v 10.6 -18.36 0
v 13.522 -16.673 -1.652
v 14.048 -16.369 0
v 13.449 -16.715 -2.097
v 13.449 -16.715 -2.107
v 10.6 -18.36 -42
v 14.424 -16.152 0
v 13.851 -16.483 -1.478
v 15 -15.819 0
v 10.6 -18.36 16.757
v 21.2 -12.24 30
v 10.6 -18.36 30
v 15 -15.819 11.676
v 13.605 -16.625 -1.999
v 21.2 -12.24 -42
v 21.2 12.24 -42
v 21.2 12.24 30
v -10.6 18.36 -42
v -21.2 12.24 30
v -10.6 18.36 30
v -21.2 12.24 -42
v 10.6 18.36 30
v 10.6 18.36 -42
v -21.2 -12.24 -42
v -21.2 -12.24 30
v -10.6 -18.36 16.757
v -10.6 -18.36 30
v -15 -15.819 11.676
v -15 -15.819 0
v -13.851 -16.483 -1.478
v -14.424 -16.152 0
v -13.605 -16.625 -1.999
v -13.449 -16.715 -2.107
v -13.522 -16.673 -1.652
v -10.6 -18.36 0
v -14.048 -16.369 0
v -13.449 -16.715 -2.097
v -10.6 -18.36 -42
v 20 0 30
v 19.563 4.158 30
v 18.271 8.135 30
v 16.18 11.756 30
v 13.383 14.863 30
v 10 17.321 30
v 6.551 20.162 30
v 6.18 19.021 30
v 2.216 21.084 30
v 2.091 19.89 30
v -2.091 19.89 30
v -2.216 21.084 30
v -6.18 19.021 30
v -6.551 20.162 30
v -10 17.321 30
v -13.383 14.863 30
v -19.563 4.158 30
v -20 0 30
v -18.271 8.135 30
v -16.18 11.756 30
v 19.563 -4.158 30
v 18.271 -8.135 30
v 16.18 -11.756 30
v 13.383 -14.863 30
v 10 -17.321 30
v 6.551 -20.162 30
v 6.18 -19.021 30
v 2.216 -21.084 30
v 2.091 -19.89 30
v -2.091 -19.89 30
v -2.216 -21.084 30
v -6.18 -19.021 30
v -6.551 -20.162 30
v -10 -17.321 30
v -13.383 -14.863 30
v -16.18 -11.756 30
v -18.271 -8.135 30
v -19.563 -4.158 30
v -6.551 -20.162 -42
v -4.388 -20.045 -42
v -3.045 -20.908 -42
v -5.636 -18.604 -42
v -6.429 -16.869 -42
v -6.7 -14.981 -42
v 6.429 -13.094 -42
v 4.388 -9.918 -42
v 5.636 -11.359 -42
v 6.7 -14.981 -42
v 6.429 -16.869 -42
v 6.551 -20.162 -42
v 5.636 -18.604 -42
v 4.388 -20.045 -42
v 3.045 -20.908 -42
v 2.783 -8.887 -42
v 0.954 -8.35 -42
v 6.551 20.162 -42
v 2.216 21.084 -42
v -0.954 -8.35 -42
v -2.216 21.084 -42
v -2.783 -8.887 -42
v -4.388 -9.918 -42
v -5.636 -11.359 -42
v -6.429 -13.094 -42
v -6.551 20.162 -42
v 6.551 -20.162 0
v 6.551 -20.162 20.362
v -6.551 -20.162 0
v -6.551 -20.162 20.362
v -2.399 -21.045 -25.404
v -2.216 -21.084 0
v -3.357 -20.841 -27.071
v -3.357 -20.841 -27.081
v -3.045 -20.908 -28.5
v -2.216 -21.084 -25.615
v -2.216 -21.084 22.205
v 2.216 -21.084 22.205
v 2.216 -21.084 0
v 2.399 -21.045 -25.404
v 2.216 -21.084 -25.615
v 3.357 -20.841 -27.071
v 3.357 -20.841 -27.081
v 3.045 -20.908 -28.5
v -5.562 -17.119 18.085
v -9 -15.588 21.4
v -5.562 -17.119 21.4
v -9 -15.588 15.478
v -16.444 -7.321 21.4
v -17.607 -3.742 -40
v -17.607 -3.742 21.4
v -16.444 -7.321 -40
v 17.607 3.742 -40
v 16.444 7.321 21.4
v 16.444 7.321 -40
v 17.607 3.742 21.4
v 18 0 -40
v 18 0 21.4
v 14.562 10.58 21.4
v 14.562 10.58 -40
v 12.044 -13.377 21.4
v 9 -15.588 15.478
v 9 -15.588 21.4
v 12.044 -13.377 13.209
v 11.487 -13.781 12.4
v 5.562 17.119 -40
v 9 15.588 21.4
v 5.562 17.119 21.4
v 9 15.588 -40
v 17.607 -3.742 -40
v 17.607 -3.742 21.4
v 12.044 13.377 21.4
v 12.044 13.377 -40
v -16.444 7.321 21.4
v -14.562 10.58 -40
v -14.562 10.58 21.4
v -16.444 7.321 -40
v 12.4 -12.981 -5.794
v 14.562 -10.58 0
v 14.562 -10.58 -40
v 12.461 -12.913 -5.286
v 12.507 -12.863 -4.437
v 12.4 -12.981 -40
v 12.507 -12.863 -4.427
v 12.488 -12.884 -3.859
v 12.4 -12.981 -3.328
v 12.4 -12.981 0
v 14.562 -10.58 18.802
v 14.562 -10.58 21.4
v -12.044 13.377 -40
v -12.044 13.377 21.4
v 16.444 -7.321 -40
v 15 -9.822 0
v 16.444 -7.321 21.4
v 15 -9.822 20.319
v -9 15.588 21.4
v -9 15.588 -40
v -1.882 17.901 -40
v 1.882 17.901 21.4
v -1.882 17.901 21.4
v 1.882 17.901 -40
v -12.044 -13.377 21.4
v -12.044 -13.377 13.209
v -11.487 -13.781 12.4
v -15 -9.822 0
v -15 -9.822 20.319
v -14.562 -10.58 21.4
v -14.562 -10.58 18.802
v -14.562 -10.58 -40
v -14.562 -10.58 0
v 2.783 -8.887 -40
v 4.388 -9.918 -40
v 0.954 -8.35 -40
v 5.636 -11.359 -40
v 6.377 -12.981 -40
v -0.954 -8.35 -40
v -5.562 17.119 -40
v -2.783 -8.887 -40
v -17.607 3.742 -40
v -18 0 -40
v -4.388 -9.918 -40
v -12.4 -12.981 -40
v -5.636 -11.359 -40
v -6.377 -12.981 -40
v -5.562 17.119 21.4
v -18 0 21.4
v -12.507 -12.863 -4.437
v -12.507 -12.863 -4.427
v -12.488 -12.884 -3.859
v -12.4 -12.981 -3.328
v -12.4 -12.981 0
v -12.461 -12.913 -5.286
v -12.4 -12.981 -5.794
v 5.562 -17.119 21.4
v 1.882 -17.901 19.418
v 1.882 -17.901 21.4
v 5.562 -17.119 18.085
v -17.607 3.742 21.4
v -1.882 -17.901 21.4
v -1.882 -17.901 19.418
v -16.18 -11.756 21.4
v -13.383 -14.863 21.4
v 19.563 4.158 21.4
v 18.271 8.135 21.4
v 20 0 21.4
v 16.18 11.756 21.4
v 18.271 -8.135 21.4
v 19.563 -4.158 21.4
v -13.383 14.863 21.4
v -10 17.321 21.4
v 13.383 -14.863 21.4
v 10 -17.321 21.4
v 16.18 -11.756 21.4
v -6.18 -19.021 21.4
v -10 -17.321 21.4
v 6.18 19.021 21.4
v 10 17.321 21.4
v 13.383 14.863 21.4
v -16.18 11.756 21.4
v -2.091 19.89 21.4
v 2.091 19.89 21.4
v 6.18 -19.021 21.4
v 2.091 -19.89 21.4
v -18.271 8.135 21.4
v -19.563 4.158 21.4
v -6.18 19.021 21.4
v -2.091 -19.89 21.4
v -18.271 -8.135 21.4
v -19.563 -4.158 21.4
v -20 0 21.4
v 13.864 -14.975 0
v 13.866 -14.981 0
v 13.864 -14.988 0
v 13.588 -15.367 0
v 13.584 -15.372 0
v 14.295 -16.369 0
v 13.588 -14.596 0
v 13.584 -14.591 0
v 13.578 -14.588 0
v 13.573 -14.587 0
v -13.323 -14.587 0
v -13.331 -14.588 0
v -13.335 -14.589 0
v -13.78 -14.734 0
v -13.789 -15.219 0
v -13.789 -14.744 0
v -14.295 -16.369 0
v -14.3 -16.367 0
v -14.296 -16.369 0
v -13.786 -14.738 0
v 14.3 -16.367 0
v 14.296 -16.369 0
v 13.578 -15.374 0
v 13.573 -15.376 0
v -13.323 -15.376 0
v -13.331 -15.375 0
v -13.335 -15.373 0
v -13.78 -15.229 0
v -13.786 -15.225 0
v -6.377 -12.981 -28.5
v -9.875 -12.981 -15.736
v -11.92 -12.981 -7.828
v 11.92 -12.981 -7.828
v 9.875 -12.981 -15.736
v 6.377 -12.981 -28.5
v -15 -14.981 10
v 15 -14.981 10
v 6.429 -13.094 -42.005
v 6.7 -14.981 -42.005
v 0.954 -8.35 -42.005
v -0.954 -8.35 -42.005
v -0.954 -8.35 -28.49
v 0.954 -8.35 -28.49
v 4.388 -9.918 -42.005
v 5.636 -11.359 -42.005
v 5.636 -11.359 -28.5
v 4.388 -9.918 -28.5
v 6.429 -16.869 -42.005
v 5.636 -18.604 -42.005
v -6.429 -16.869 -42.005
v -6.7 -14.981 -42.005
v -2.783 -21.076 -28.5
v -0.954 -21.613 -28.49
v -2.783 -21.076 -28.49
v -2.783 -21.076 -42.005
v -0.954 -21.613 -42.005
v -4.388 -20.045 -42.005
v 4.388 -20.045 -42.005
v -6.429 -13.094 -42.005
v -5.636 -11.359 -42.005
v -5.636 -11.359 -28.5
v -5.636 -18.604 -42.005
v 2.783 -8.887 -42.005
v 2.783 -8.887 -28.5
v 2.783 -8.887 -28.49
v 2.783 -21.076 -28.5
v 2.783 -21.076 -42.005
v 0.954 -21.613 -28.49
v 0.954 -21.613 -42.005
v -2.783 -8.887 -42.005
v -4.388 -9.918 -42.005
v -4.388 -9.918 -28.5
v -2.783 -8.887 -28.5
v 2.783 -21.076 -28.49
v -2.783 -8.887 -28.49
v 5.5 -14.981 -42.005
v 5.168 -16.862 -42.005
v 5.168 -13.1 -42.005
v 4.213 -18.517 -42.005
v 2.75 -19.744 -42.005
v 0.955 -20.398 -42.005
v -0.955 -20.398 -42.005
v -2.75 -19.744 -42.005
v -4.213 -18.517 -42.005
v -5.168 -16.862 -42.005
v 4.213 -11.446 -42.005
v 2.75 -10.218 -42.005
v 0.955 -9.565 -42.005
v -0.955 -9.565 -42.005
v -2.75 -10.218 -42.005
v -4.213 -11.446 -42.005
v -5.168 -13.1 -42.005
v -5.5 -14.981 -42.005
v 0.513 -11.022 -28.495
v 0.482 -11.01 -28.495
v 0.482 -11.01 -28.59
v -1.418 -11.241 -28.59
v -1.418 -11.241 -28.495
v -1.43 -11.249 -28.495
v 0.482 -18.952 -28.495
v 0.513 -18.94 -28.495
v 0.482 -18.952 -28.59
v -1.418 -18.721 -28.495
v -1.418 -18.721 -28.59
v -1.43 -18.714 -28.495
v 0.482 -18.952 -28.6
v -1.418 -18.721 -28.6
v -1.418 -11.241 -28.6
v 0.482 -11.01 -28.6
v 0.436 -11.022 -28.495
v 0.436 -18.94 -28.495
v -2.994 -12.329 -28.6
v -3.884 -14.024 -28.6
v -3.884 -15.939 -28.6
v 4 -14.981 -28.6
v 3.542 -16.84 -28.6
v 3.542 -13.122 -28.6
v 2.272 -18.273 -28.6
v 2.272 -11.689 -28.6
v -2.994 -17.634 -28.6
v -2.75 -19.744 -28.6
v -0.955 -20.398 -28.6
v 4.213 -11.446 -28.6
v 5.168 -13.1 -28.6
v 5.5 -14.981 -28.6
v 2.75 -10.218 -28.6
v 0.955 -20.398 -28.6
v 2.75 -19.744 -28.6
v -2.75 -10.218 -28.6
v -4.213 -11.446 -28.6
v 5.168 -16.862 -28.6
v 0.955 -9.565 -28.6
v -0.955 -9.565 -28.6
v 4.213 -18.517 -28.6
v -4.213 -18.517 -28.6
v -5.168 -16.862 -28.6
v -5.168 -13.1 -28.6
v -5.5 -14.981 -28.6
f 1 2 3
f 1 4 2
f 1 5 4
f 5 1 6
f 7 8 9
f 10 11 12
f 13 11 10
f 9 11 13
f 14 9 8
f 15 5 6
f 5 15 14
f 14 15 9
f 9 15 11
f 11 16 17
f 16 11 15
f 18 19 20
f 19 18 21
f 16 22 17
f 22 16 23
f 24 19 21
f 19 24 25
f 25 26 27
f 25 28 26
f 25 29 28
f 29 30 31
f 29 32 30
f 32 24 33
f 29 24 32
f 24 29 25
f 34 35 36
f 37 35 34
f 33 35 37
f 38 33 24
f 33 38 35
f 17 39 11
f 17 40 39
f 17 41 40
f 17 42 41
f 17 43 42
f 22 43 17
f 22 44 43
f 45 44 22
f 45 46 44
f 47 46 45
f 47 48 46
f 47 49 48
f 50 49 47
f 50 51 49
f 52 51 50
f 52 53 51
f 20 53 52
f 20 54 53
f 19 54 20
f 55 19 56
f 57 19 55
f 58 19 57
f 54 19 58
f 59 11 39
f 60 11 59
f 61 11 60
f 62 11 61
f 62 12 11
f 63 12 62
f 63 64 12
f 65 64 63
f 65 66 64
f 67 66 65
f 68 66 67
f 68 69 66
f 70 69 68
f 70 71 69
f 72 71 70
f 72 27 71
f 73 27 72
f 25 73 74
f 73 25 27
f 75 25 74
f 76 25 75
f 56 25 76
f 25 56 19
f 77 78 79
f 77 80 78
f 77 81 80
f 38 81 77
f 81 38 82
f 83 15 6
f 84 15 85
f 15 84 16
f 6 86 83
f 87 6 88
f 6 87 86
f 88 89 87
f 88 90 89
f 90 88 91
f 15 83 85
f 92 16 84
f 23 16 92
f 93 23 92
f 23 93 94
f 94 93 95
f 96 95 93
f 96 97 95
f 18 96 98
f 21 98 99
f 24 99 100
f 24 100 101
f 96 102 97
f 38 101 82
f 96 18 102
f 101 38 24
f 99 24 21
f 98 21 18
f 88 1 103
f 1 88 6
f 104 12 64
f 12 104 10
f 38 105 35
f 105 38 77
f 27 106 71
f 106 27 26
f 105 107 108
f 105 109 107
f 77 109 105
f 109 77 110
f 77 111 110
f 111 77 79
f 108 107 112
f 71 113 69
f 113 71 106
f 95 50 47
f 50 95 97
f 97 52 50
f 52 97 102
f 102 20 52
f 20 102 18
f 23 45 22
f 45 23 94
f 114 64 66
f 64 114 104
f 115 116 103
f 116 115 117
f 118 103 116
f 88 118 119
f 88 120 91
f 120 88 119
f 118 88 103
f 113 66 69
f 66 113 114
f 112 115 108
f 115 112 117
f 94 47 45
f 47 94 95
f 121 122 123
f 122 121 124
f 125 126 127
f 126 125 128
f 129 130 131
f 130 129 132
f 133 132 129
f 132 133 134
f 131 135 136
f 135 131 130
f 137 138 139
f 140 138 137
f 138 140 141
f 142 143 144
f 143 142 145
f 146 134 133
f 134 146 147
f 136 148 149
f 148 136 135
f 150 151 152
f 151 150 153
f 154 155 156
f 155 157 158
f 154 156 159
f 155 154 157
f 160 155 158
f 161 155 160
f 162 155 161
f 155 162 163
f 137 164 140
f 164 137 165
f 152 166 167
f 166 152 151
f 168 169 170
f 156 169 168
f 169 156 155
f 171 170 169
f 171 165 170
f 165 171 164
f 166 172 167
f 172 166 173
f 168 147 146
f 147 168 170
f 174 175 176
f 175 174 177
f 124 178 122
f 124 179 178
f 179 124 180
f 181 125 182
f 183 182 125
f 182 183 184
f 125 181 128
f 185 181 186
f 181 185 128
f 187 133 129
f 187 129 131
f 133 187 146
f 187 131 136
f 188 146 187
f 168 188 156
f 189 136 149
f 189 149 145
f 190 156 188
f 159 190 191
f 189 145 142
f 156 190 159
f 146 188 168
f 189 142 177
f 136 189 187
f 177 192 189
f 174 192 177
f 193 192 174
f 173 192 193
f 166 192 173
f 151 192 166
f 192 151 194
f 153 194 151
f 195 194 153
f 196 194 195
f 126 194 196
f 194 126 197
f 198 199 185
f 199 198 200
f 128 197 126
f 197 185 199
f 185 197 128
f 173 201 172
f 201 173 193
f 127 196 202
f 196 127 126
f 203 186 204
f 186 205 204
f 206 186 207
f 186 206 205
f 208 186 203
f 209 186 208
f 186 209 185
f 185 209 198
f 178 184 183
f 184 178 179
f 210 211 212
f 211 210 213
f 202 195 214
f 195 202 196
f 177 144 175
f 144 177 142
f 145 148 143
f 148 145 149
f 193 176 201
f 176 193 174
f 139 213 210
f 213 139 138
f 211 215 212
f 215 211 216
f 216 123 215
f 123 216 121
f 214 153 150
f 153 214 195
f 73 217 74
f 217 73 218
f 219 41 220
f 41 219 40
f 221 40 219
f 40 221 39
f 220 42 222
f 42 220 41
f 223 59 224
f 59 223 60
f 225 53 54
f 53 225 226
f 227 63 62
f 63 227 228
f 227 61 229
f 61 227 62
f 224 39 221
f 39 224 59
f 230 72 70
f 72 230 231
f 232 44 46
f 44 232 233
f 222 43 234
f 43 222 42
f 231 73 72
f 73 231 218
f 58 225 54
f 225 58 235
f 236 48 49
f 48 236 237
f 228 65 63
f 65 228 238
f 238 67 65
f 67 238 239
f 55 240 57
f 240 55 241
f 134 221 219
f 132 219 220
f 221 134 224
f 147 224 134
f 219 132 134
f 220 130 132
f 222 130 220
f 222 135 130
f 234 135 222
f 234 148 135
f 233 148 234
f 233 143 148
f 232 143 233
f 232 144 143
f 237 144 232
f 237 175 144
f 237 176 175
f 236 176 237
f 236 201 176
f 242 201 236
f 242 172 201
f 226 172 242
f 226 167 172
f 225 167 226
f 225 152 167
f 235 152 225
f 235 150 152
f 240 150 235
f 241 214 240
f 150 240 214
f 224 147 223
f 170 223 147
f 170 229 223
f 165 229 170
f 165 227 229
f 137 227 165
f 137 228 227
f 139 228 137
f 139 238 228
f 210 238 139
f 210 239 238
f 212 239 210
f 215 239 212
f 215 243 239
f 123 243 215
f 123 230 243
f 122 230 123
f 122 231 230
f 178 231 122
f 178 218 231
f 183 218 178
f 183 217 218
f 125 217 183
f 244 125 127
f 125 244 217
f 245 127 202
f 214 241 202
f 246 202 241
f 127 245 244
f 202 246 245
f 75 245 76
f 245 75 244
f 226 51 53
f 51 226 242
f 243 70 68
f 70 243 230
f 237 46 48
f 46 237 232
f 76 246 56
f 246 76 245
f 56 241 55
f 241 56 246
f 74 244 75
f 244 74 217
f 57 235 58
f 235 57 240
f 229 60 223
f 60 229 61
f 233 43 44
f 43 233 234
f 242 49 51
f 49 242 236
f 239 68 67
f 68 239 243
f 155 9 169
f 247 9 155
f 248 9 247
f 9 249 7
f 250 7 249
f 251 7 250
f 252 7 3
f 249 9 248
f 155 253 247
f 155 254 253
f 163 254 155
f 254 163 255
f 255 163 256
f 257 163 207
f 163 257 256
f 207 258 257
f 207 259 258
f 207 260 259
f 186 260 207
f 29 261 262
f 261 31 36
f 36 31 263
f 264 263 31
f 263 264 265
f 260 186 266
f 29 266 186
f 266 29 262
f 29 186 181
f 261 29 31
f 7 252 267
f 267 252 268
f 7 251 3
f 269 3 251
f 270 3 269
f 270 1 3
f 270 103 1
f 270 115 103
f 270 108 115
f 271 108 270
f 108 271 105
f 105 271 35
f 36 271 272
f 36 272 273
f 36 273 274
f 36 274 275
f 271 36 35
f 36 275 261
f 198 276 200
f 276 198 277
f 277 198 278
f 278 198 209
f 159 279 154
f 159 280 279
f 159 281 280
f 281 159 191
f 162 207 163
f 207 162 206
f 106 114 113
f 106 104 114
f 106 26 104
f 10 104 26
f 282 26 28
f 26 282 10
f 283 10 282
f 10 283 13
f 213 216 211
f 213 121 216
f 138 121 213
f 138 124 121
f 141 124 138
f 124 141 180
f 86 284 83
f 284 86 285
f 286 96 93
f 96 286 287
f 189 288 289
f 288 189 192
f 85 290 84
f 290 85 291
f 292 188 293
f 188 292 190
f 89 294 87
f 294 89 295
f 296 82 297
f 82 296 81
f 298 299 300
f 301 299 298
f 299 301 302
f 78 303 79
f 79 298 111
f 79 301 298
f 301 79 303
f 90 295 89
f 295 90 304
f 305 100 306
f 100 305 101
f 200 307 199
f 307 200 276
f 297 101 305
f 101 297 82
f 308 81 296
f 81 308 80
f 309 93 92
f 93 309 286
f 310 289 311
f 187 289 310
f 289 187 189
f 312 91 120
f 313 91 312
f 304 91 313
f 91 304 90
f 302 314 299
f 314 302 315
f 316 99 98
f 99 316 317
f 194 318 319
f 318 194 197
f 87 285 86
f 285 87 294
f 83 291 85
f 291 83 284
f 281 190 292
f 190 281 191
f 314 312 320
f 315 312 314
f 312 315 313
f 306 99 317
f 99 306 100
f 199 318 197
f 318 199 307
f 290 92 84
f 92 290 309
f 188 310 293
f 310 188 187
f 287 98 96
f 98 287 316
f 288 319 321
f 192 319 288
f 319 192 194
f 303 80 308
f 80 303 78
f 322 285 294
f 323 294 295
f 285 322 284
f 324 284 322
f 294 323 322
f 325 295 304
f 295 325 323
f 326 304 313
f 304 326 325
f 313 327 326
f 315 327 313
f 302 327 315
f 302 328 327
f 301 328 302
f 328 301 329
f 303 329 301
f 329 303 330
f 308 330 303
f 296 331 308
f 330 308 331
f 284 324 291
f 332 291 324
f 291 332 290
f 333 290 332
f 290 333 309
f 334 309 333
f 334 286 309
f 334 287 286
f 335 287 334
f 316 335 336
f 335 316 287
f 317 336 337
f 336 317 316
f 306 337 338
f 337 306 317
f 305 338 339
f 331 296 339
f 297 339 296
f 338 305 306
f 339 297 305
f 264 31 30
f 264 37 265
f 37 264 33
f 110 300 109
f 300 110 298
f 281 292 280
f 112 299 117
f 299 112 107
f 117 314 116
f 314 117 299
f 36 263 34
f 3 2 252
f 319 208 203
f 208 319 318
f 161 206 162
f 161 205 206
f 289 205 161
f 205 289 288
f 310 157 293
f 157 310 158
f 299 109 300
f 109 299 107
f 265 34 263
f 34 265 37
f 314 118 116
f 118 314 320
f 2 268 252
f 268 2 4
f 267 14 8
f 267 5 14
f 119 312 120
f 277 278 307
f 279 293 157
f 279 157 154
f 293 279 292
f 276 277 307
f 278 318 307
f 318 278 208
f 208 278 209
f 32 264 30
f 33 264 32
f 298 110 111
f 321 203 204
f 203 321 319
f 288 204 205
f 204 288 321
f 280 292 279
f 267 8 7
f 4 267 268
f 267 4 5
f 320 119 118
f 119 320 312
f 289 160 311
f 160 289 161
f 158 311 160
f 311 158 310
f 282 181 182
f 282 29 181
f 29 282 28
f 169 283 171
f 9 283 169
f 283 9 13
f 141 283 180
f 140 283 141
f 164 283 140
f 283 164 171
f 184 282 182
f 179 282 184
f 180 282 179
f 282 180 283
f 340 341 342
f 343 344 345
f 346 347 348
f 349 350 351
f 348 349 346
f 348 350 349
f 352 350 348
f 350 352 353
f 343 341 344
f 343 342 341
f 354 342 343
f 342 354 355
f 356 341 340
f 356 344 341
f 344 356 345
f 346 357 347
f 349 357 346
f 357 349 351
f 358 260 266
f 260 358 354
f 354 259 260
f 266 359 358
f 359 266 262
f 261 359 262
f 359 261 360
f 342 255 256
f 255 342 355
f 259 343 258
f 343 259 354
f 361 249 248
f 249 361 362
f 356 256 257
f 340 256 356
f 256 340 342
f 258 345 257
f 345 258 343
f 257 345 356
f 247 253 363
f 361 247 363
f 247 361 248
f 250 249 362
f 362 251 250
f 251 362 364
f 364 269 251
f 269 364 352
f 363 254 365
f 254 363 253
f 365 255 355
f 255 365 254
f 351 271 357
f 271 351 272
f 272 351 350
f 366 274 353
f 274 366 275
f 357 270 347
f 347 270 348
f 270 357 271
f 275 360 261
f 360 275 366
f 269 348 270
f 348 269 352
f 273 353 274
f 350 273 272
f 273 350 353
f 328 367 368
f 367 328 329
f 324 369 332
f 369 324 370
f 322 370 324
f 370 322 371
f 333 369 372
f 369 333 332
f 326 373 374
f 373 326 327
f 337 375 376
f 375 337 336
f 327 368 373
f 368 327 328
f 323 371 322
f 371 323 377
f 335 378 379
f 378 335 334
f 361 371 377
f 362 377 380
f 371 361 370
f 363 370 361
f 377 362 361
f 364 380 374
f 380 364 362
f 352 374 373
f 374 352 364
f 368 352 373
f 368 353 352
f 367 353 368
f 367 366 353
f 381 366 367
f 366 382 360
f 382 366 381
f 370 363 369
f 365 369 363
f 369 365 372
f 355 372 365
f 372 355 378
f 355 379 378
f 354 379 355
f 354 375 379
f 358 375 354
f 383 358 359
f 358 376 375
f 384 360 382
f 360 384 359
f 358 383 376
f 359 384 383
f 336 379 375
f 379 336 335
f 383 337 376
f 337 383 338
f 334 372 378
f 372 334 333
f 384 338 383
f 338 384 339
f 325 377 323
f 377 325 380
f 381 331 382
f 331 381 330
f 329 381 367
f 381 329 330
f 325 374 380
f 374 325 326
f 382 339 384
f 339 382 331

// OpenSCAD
// file: OpenSCAD_support/straight_flue.scad
// straight loft and accesoires 

module curvedFlueLoft(upperDiameter, lowerDiameter, loftCeiling, loftFloor){
    union(){
        // tube
        hull(){
        	translate([0, airSupplyY, loftFloor]) 
                cylinder(h=0.01, d=lowerDiameter, center=true);
        	translate([0, airSupplyY, (ground + tubeInsert)])
                cylinder(h=0.01, d=lowerDiameter, center=true);
        }
        // straight flue
            hull(){
            translate ([labiumWidth*-0.45, airSupplyY, loftCeiling]) 
                cylinder (0.01, d=upperDiameter);
            translate ([labiumWidth*0.45, airSupplyY, loftCeiling]) 
                cylinder (0.01, d=upperDiameter);
            translate ([0, airSupplyY, (loftFloor + tubeInsert)]) 
                cylinder (0.01, d=lowerDiameter);
        };
    };
}

module outer_straight_flue(){
    curvedFlueLoft(    
        upperDiameter = (flueWidth + 2 * minWallThickness), 
        lowerDiameter = (outerTube + 2 * minWallThickness),
        loftCeiling = 0,
        loftFloor = ground
    );
}

module inner_straight_flue(){
    curvedFlueLoft(
        upperDiameter = flueWidth, 
        lowerDiameter = innerTube, 
        loftCeiling = 0.1, 
        loftFloor = (ground-0.1)
    ); 
}

module straight_flue_fill(){
    translate ([0, 0, ground])
        intersection(){
            cylinder(height, d=(outerDiameter + 2* minWallThickness));
            translate([labiumWidth*-0.5, airSupplyY - outerDiameter + minWallThickness + flueWidth, 0])
                cube([labiumWidth, outerDiameter, floorThickness + lengthFlue]);
        }   
}
// file: OpenSCAD_support/straight_labium.scad
// straight labium cut and accesoires

module straight_labium_cut(){
    intersection(){
        translate ([-labiumWidth/2,0,0])
            rotate([90, 0, 90])
                linear_extrude(labiumWidth, $fn=50) 
                    polygon(points = labium_polygon_points);
        translate([labiumWidth*-0.25, 2*airSupplyY - labiumWidth*0.25, 0]) 
            minkowski(){
                cube([labiumWidth/2, -2*airSupplyY, -2*airSupplyY]);
                cylinder(r=labiumWidth/4,h=-2*airSupplyY);
            }
    }
};

module straight_labium_fill(){
    intersection(){
        translate ([-labiumWidth/2,0,0])
            rotate([90, 0, 90])
                linear_extrude(labiumWidth, $fn=50) 
                    polygon(points = labium_plus_points);
        cylinder(outerDiameter/2, d=outerDiameter);
    }
}
// file: OpenSCAD_support/common.scad
module basicShape(height)
translate ([0, 0, ground]) union(){
    difference(){
	   	union(){
	        intersection(){
	            rotate ([0, 0, 30]) 
                    cylinder_outer(height, (outerDiameter*0.5+minWallThickness), 6);
	            translate ([0,0,(height/2)]) 
                    cube ([outerDiameter*2, (sqrt(3)*(outerDiameter*0.5+minWallThickness)), height], center = true);
	 	    };
	        cylinder(height, d=(outerDiameter + 2* minWallThickness)); 
	   	};
        union(){
        	translate ([0, 0, floorThickness]) 
                cylinder(height, d=innerDiameter, center=false);
        	translate ([0, 0, (height - pipeInsert)]) 
                cylinder(height, d=outerDiameter, center=false);
        };
    };
};

module cylinder_outer(height,radius,fn){  	//from https://en.wikibooks.org/wiki/OpenSCAD_User_Manual/undersized_circular_objects
   fudge = 1/cos(180/fn);
   cylinder(h=height,r=radius*fudge,$fn=fn);
}
   
module airSupplySpacer(){
    translate ([0, airSupplyY, (ground-0.1)]) 
    cylinder (tubeInsert, d=outerTube, center=false);
}
// main file
// flue pippe. work in progress.

include <OpenSCAD_support/common.scad>
include <OpenSCAD_support/straight_labium.scad>
include <OpenSCAD_support/straight_flue.scad>

// variables
outerDiameter = 40;
innerDiameter = 36;
labiumWidth = 30;
outCut = 10;
lengthFlue = 40; // coordinate this with the frequency
outerTube = 11;
innerTube = 8;
minWallThickness = 1.2;
floorThickness = 2;
flueWidth = 0.8;

// proportions, are most likely good like that
tubeInsert = outerTube + 2.5;       // length
pipeInsert = innerDiameter * 0.1 + 5; // length
height = floorThickness
    + lengthFlue
    + outCut 
    + outerDiameter *0.5; 
    
// calculations, don't touch in production use
ground = (lengthFlue + floorThickness)*-1;
soundingLength = height - pipeInsert - floorThickness;
airSupplyY = sqrt((outerDiameter+2*minWallThickness)*(outerDiameter+2*minWallThickness) - labiumWidth*labiumWidth)/-2;
labium_polygon_points = 
    [[0,0],
    [0, outCut - 2*airSupplyY],
    [airSupplyY, outCut],
    [2*airSupplyY, outCut - 2*airSupplyY],
    [2*airSupplyY,0]];
labium_plus_points = 
    [[2*airSupplyY, outCut - 2*airSupplyY],
    [airSupplyY + minWallThickness, outCut + 2*minWallThickness],
    [airSupplyY, outCut],];

// announcing sounding length
echo(str("the sounding length inside the model in mm: ", soundingLength));

// flueLength warning
if (lengthFlue < outerTube * 2)
    echo("lengthFlue is too short");

// logic
difference(){
    union(){
        basicShape(height); 
        straight_flue_fill();
        straight_labium_fill();
        outer_straight_flue();
    };
    union(){
        straight_labium_cut();
        inner_straight_flue(); 
        airSupplySpacer();
    };
};
  

echo(version = version());
